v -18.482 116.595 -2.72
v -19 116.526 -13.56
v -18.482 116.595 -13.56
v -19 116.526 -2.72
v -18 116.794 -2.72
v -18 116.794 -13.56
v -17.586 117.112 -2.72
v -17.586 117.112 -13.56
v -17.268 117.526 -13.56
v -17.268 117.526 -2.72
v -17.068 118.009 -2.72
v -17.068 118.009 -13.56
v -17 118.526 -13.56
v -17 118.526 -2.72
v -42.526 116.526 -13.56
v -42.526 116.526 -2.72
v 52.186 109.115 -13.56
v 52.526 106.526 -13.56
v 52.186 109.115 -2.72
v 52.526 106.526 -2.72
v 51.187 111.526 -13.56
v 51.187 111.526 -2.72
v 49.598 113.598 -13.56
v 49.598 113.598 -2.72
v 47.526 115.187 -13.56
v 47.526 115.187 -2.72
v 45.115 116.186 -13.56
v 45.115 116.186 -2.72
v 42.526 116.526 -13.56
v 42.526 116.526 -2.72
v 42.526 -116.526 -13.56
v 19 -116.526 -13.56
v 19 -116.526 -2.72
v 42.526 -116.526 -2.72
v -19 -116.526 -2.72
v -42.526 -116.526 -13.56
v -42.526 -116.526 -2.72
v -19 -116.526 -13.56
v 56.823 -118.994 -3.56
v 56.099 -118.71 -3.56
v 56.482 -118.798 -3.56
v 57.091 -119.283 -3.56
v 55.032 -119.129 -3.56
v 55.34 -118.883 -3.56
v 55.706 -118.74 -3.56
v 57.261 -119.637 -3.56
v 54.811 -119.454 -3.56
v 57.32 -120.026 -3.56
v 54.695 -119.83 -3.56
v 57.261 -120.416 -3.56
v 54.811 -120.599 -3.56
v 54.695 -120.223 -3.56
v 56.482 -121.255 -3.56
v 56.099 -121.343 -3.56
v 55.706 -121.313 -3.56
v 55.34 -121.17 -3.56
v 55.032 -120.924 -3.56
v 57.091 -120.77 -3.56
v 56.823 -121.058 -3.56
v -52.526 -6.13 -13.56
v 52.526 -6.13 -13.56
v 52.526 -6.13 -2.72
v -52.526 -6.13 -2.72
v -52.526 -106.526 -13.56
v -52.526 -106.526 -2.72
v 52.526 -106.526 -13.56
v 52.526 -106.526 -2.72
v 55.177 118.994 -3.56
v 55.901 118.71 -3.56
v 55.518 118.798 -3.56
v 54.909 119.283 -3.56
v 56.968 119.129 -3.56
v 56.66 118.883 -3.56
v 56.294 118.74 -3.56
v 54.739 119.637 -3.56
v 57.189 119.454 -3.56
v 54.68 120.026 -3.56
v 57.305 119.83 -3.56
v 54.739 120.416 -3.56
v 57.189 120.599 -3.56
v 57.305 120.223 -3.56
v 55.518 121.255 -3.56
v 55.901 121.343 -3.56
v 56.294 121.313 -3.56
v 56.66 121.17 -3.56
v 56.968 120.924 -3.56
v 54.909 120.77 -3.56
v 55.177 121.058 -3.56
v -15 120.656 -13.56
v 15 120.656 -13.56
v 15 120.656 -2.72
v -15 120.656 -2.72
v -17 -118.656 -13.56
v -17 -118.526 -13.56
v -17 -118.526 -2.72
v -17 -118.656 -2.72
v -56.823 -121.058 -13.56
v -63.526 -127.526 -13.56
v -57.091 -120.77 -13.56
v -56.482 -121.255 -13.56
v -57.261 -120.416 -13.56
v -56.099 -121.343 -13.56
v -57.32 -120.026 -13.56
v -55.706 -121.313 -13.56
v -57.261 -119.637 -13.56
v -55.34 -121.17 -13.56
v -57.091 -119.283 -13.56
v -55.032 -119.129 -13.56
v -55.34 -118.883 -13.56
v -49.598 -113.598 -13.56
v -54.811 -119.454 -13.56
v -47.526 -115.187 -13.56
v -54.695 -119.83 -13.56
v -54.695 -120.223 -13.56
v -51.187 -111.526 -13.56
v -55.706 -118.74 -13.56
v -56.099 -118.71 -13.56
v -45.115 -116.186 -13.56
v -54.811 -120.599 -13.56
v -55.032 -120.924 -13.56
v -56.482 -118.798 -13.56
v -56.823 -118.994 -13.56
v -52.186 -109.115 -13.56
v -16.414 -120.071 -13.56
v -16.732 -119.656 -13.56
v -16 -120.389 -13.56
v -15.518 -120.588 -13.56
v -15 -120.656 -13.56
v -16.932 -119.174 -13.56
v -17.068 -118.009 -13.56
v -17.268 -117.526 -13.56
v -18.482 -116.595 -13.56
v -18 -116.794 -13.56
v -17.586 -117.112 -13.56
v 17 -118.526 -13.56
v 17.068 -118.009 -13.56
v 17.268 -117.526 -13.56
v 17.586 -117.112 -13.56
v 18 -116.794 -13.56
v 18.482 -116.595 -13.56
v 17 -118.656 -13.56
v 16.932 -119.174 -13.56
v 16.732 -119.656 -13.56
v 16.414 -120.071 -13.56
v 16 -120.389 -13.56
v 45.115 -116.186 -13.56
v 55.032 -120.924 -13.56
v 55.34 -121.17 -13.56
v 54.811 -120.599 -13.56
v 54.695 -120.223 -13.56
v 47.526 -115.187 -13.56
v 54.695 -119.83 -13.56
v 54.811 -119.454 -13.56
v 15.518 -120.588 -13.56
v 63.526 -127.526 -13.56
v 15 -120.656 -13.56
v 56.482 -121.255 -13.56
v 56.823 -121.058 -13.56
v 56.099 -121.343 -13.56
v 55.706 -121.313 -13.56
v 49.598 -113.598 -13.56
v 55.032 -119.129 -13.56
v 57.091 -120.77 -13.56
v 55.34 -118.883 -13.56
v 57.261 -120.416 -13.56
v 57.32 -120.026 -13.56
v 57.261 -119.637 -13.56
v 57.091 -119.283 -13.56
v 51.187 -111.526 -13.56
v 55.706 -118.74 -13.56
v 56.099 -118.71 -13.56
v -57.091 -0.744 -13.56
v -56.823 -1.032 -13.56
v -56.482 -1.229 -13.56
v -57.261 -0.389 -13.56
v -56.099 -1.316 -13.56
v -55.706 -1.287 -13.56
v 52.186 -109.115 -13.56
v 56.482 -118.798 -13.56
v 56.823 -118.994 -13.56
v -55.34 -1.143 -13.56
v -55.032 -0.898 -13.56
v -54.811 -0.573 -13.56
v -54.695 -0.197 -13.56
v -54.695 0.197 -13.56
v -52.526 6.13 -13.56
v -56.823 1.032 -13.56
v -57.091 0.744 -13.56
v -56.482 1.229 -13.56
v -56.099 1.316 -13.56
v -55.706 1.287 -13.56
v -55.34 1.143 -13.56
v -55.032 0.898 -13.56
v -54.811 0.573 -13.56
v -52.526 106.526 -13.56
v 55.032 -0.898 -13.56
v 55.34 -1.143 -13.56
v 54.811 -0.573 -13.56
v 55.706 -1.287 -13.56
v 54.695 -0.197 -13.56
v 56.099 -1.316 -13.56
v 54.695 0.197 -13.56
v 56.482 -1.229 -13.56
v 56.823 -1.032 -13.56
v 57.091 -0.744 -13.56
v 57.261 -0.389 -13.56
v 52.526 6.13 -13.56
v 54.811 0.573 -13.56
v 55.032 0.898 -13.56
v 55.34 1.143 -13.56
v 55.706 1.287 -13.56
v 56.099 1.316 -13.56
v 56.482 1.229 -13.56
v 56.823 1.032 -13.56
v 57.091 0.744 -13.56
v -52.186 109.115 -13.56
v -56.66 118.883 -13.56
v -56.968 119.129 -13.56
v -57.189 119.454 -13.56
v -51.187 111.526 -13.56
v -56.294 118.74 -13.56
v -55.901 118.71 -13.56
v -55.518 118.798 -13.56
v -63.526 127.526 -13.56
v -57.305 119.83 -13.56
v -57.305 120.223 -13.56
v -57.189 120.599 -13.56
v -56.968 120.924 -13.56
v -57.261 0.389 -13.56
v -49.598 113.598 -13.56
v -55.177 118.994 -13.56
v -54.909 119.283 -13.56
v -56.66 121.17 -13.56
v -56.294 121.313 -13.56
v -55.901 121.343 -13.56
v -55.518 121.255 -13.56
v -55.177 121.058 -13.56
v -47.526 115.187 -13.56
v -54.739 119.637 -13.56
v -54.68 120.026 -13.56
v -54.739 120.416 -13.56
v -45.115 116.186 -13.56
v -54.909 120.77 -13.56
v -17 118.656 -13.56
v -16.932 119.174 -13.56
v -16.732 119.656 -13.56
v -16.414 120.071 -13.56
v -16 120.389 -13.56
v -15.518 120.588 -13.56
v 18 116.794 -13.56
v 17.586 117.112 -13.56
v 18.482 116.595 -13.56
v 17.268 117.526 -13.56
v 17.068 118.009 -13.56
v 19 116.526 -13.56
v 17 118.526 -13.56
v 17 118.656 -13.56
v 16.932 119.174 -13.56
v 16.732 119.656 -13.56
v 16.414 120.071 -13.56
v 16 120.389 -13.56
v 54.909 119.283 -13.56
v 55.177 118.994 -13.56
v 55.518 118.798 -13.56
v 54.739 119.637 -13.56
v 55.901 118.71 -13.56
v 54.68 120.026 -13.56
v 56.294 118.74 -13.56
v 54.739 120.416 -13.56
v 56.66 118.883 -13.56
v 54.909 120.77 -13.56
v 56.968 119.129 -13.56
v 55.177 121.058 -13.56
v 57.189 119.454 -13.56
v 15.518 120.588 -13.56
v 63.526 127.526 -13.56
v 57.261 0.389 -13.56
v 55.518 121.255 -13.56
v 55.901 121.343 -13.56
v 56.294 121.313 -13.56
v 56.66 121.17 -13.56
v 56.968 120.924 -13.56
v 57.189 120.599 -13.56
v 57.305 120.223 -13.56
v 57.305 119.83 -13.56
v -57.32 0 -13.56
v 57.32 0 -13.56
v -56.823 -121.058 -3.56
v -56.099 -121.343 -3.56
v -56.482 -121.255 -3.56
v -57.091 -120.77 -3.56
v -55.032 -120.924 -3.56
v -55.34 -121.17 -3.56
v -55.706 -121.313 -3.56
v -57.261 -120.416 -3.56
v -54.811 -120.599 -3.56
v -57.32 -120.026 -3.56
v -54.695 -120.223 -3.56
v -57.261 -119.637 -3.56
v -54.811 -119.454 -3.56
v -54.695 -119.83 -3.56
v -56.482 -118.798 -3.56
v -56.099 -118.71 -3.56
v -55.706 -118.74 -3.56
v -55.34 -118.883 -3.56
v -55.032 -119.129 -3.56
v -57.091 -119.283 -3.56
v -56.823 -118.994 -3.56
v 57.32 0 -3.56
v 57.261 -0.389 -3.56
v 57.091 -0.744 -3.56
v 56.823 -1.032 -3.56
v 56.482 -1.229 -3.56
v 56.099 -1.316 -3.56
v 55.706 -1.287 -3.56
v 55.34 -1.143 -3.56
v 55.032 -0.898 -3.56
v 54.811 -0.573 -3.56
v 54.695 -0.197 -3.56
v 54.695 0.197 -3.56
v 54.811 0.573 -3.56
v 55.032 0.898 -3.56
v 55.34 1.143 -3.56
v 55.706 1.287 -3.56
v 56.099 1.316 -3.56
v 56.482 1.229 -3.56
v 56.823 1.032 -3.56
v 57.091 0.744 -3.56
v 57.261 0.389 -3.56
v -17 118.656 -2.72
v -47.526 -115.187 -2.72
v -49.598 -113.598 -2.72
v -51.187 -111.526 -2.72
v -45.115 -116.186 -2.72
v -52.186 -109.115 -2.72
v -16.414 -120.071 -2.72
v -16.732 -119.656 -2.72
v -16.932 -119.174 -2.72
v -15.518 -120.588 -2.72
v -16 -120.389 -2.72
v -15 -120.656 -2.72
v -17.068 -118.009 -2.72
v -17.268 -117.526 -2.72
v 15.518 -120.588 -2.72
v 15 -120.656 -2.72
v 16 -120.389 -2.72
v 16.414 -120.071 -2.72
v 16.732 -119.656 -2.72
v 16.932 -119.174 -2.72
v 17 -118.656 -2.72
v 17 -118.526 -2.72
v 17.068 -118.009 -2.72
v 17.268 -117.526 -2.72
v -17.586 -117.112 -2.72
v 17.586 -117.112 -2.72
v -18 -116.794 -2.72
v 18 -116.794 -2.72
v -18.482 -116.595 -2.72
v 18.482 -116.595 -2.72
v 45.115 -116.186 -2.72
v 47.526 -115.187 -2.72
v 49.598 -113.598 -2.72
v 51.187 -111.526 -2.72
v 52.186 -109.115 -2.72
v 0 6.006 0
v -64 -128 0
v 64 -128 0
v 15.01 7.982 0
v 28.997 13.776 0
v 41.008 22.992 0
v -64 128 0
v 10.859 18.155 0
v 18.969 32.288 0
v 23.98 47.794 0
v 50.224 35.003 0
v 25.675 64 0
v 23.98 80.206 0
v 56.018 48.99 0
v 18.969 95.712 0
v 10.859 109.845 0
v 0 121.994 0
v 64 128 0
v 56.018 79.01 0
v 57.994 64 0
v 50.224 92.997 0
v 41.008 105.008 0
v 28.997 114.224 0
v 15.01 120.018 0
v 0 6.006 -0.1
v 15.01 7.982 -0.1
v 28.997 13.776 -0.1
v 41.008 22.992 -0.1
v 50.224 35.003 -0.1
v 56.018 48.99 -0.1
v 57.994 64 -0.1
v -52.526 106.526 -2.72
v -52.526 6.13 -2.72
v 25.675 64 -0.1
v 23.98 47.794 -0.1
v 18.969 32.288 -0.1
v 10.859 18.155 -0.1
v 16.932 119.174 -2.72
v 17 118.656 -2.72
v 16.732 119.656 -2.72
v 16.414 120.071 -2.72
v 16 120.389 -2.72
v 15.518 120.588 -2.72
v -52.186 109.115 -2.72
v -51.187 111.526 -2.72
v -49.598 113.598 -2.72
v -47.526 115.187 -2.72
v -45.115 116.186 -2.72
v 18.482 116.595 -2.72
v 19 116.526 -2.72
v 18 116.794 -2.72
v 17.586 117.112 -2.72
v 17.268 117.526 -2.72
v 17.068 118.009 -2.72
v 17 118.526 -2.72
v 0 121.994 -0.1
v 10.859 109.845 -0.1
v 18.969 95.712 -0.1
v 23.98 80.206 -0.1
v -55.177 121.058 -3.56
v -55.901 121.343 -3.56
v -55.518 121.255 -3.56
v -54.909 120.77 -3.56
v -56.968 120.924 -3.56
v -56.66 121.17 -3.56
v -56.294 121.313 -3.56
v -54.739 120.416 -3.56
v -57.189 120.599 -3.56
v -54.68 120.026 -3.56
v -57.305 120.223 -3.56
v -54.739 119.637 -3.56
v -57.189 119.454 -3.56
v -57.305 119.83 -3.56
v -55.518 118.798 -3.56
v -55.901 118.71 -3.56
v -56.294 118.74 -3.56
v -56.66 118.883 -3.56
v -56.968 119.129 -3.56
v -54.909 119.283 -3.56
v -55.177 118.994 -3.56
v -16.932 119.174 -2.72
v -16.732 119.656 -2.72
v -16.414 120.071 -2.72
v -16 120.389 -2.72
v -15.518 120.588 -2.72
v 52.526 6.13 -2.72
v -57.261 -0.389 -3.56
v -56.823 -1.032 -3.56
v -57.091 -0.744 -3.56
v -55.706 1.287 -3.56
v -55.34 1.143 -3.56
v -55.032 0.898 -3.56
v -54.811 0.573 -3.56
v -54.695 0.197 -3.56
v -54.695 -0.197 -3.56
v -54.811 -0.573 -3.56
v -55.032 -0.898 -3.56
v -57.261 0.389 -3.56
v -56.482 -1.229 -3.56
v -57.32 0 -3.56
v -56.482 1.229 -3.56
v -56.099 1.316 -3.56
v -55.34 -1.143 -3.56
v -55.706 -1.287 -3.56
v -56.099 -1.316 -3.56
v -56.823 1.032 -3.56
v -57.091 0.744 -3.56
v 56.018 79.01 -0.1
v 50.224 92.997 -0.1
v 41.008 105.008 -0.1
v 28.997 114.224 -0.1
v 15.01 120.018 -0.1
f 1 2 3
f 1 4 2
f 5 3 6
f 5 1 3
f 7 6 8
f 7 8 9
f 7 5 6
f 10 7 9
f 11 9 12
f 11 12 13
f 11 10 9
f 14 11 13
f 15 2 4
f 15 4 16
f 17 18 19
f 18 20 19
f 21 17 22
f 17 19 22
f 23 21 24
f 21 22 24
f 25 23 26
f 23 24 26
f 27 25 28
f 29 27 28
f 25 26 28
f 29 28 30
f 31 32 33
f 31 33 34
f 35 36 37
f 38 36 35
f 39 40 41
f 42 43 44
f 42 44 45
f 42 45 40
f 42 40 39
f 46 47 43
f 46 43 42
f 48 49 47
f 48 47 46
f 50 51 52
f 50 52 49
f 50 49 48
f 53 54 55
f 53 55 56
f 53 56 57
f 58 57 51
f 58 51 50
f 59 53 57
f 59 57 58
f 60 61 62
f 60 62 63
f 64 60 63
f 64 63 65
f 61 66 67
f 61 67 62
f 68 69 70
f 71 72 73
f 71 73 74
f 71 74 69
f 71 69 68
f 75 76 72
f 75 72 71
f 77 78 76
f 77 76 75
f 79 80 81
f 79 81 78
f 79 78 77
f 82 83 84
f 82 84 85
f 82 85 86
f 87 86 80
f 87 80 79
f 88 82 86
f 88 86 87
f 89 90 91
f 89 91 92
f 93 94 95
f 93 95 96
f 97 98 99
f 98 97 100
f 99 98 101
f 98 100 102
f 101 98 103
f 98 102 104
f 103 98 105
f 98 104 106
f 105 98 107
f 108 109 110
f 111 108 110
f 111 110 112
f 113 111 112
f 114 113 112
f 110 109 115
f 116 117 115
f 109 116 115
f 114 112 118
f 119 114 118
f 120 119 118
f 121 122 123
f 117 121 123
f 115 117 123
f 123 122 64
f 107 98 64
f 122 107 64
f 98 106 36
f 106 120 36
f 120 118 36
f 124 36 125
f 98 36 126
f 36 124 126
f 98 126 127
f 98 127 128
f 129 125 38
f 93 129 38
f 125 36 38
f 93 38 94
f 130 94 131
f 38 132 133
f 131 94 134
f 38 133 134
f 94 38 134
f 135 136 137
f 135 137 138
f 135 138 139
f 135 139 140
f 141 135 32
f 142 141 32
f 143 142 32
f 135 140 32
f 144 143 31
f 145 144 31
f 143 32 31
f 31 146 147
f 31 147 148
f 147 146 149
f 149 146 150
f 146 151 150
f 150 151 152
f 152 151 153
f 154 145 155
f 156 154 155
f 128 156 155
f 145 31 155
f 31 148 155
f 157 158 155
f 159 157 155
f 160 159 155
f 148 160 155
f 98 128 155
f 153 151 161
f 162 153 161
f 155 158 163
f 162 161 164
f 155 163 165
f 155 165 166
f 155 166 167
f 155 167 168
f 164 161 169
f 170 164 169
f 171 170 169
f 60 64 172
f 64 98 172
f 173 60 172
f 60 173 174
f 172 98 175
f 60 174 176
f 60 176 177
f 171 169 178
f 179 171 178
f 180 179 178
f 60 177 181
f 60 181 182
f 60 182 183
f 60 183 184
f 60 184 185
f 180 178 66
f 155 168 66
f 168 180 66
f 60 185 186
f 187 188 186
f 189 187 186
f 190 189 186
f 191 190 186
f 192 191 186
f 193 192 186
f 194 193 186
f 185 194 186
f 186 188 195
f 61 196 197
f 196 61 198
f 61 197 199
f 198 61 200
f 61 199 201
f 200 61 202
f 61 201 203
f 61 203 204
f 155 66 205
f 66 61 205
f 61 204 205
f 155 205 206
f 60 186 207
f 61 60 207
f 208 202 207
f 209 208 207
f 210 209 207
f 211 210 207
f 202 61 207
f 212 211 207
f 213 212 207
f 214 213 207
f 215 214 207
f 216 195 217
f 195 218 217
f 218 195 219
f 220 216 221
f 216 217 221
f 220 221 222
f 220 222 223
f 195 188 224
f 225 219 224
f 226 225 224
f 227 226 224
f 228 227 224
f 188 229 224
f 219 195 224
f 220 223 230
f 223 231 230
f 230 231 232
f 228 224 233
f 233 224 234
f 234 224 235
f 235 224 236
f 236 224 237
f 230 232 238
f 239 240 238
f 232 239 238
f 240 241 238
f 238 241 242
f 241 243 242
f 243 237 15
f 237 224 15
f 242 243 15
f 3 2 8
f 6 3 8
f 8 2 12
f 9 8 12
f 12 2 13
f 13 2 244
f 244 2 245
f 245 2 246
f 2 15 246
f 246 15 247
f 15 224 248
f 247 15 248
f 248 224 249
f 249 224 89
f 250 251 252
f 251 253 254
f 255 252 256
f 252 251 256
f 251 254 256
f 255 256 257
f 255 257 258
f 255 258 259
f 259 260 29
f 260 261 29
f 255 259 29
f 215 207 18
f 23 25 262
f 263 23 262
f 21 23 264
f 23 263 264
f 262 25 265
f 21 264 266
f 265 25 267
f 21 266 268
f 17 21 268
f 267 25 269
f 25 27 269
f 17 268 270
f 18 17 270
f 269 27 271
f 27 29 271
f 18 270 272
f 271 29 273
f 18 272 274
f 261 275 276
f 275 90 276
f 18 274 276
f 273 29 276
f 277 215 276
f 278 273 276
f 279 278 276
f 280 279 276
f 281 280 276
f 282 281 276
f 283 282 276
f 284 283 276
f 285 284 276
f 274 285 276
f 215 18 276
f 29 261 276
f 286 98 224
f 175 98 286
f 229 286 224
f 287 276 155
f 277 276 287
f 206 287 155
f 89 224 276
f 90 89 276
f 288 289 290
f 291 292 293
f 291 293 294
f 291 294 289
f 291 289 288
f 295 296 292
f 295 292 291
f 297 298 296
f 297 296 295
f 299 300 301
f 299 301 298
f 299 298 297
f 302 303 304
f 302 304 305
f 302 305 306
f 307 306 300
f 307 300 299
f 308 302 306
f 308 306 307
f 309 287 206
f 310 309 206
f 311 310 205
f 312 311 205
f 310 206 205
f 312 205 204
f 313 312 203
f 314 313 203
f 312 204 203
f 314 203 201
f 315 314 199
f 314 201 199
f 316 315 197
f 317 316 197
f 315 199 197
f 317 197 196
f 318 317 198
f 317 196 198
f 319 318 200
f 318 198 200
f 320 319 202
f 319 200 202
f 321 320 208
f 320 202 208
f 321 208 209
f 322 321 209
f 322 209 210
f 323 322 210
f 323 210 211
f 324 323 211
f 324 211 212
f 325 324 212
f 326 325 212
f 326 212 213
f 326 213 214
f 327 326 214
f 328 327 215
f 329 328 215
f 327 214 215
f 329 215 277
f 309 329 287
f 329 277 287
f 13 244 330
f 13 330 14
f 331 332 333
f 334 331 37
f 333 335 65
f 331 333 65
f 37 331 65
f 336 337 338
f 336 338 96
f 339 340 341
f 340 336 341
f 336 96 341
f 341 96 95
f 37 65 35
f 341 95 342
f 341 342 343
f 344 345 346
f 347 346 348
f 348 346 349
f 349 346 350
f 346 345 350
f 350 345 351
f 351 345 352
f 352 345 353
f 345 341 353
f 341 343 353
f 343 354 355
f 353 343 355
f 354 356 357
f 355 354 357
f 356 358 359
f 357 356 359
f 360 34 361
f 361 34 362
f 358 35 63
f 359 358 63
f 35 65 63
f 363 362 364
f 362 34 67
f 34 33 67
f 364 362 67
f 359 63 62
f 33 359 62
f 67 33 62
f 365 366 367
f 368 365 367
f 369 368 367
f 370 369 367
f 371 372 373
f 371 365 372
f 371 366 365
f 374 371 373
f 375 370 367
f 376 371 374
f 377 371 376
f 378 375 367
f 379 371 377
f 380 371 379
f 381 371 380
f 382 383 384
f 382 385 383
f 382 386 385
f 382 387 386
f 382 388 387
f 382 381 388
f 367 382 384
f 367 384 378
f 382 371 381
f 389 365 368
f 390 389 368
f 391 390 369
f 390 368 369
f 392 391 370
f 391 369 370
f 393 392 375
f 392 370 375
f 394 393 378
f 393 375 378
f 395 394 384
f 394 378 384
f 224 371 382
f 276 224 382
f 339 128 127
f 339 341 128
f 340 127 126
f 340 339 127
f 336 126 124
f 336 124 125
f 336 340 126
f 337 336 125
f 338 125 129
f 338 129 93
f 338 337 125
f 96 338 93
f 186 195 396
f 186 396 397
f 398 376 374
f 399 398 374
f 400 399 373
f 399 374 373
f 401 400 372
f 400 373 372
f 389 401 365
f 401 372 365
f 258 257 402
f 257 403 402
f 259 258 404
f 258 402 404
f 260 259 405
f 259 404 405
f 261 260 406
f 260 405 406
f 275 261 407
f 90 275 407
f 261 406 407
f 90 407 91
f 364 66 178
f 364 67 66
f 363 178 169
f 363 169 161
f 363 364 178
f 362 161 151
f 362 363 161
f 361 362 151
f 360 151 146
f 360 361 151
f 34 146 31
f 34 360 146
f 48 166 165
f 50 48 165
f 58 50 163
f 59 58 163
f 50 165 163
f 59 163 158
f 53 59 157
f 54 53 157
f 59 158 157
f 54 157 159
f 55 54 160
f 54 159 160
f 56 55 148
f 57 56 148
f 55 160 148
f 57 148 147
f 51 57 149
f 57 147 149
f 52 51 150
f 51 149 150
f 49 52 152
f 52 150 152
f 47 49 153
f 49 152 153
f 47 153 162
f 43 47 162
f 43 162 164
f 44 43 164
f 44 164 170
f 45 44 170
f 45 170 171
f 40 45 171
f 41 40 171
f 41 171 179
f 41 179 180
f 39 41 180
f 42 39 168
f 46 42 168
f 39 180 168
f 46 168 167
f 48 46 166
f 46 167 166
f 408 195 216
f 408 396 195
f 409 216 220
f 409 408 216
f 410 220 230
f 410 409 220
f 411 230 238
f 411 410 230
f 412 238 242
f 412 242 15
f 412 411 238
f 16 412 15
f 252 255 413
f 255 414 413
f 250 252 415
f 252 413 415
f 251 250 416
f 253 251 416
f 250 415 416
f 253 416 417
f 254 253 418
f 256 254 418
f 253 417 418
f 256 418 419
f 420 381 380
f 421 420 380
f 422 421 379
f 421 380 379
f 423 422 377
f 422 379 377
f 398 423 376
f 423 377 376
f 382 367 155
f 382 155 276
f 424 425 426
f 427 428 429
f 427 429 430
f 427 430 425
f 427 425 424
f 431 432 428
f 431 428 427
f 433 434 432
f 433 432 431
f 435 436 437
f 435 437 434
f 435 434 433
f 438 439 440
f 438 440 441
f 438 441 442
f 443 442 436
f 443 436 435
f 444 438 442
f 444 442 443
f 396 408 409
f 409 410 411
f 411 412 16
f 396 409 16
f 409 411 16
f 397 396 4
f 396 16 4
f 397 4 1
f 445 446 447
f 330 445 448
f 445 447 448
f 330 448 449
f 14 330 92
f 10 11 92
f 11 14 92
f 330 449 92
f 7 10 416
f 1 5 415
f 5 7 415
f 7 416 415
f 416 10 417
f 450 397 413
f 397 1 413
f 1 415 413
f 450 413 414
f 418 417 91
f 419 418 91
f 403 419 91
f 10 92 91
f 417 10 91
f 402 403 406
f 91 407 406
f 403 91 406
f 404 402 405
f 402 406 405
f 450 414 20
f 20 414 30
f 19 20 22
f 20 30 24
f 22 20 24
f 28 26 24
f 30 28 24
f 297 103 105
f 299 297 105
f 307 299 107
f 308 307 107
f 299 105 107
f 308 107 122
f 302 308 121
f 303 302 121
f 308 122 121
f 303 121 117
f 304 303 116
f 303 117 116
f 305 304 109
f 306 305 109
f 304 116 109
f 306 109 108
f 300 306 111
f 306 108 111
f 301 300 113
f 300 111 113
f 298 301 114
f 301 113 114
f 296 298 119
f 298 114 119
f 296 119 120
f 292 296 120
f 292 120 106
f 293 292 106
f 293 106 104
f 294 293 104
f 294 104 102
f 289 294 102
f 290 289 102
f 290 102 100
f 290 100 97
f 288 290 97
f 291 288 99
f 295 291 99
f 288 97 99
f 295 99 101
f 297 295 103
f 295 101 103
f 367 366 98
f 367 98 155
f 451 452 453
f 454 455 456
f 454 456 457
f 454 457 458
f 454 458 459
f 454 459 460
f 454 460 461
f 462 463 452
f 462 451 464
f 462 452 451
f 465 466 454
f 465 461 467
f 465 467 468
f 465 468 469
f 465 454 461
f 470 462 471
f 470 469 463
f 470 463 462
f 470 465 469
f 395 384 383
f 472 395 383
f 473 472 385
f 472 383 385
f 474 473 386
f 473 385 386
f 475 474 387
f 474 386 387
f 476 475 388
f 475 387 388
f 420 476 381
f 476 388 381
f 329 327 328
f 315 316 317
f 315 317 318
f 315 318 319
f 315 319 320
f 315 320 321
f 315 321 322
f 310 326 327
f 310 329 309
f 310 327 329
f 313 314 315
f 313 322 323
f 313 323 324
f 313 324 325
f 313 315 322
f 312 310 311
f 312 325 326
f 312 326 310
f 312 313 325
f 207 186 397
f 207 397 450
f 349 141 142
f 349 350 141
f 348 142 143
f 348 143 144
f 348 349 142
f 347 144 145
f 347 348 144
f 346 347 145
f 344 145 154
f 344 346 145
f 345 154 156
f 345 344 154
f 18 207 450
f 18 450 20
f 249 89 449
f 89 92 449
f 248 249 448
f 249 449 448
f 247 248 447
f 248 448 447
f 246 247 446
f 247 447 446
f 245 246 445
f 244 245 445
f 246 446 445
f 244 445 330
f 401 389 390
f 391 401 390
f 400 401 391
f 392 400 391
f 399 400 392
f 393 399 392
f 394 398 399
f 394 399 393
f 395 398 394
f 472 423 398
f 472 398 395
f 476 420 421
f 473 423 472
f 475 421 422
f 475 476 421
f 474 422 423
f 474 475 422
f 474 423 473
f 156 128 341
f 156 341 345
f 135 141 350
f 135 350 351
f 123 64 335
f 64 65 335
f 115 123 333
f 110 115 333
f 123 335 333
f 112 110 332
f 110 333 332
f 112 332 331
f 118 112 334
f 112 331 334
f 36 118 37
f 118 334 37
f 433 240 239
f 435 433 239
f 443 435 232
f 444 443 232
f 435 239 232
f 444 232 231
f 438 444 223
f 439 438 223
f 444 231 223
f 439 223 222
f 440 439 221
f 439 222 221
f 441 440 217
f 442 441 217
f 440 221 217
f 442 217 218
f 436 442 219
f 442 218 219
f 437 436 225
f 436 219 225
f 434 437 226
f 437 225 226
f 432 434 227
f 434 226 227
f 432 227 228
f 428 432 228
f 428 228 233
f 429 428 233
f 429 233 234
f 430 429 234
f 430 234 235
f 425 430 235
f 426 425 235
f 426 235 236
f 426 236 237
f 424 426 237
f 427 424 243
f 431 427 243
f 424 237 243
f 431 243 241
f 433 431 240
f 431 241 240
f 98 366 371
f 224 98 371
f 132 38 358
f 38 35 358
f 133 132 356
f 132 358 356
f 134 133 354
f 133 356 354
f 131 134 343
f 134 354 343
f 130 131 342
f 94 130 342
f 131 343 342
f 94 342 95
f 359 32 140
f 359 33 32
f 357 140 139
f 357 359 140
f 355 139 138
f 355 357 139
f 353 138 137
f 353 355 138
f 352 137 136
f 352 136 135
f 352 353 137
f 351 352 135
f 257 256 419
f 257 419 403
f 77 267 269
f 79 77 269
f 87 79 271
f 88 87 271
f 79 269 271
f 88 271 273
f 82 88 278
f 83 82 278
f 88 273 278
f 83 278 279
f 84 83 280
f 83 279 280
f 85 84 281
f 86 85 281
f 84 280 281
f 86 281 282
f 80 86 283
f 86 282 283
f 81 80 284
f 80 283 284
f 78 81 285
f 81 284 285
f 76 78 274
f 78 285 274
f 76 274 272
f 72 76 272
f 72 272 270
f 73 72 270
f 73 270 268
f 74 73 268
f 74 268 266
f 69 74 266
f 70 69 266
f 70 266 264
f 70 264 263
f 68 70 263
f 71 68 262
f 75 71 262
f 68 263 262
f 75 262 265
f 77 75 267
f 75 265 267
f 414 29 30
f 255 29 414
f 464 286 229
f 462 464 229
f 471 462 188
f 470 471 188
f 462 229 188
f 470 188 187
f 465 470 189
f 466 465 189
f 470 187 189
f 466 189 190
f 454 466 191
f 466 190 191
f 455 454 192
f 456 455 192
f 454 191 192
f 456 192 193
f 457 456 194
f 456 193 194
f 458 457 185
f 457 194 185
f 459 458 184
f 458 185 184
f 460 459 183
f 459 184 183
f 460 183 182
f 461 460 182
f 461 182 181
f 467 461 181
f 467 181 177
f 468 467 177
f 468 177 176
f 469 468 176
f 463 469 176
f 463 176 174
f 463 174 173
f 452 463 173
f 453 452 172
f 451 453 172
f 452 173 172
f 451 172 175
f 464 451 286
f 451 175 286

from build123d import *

# Parameters (mm, degrees)
SKETCH1_W           = 128
SKETCH1_H           = 256
BOSS_EXTRUDE1_DEPTH = 13.56
BOSS_EXTRUDE1_DRAFT = -2
CUT_EXTRUDE1_DEPTH  = 10.84
SKETCH3_R           = 1.32
CUT_EXTRUDE2_DEPTH  = 10
FILLET1_R           = 10
FILLET2_R           = 2
CUT_EXTRUDE3_DEPTH  = 0.1


with BuildPart() as part:
    # Sketch1 → Boss-Extrude1 (with draft: the straight prism first)
    with BuildSketch(Plane.XY):
        Rectangle(SKETCH1_W, SKETCH1_H)
    extrude(amount=-BOSS_EXTRUDE1_DEPTH)
    # Boss-Extrude1: the draft: its side faces are tilted about the plane it starts from
    boss_extrude1_sides = [part.faces().sort_by_distance(p)[0] for p in [
        (0, -128, -6.78),
        (64, 0, -6.78),
        (0, 128, -6.78),
        (-64, 0, -6.78),
    ]]
    draft(boss_extrude1_sides, Plane.XY, BOSS_EXTRUDE1_DRAFT)

    # Sketch2 → Cut-Extrude1 (cut)
    with BuildSketch(Plane(origin=(0, 0, -13.56), x_dir=(-1, 0, 0), z_dir=(0, 0, -1))):
        Polygon((-52.526474366, -6.13), (52.526474366, -6.13), (52.526474366, -116.526474366), (17, -116.526474366), (17, -120.656474366), (-17, -120.656474366), (-17, -116.526474366), (-52.526474366, -116.526474366), align=None)
        Polygon((-52.526474366, 6.13), (-52.526474366, 116.526474366), (-17, 116.526474366), (-17, 120.656474366), (17, 120.656474366), (17, 116.526474366), (52.526474366, 116.526474366), (52.526474366, 6.13), align=None)
    extrude(amount=-CUT_EXTRUDE1_DEPTH, mode=Mode.SUBTRACT)

    # Sketch3 → Cut-Extrude2 (cut)
    with BuildSketch(Plane(origin=(0, 0, -13.56), x_dir=(-1, 0, 0), z_dir=(0, 0, -1))):
        with Locations((56, -120.026474366)):
            Circle(SKETCH3_R)
        with Locations((56, 0)):
            Circle(SKETCH3_R)
        with Locations(Location((56, 120.026474366, 0), (0, 0, 180))):
            Circle(SKETCH3_R)
        with Locations(Location((-56, -120.026474366, 0), (0, 0, 180))):
            Circle(SKETCH3_R)
        with Locations(Location((-56, 0, 0), (0, 0, 180))):
            Circle(SKETCH3_R)
        with Locations((-56, 120.026474366)):
            Circle(SKETCH3_R)
    extrude(amount=-CUT_EXTRUDE2_DEPTH, mode=Mode.SUBTRACT)

    # Fillet1
    fillet1_edges = [part.edges().sort_by_distance(p)[0] for p in [
        (52.526474366, 116.526474366, -8.14),
        (-52.526474366, 116.526474366, -8.14),
        (-52.526474366, -116.526474366, -8.14),
        (52.526474366, -116.526474366, -8.14),
    ]]
    fillet(fillet1_edges, radius=FILLET1_R)

    # Fillet2
    fillet2_edges = [part.edges().sort_by_distance(p)[0] for p in [
        (17, 116.526474366, -8.14),
        (17, 120.656474366, -8.14),
        (-17, 120.656474366, -8.14),
        (-17, 116.526474366, -8.14),
        (-17, -116.526474366, -8.14),
        (-17, -120.656474366, -8.14),
        (17, -120.656474366, -8.14),
        (17, -116.526474366, -8.14),
    ]]
    fillet(fillet2_edges, radius=FILLET2_R)

    # Sketch5 → Cut-Extrude3 (cut)
    with BuildSketch(Plane.XY):
        with BuildLine():
            ThreePointArc((0, 6.005906984), (41.00801644, 22.99198356), (57.994093016, 64))
            ThreePointArc((57.994093016, 64), (41.00801644, 105.00801644), (0, 121.994093016))
            ThreePointArc((0, 121.994093016), (18.969220237, 95.711668256), (25.674983731, 64))
            ThreePointArc((25.674983731, 64), (18.969220237, 32.288331744), (0, 6.005906984))
        make_face()
    extrude(amount=-CUT_EXTRUDE3_DEPTH, mode=Mode.SUBTRACT)


solid = part.part
